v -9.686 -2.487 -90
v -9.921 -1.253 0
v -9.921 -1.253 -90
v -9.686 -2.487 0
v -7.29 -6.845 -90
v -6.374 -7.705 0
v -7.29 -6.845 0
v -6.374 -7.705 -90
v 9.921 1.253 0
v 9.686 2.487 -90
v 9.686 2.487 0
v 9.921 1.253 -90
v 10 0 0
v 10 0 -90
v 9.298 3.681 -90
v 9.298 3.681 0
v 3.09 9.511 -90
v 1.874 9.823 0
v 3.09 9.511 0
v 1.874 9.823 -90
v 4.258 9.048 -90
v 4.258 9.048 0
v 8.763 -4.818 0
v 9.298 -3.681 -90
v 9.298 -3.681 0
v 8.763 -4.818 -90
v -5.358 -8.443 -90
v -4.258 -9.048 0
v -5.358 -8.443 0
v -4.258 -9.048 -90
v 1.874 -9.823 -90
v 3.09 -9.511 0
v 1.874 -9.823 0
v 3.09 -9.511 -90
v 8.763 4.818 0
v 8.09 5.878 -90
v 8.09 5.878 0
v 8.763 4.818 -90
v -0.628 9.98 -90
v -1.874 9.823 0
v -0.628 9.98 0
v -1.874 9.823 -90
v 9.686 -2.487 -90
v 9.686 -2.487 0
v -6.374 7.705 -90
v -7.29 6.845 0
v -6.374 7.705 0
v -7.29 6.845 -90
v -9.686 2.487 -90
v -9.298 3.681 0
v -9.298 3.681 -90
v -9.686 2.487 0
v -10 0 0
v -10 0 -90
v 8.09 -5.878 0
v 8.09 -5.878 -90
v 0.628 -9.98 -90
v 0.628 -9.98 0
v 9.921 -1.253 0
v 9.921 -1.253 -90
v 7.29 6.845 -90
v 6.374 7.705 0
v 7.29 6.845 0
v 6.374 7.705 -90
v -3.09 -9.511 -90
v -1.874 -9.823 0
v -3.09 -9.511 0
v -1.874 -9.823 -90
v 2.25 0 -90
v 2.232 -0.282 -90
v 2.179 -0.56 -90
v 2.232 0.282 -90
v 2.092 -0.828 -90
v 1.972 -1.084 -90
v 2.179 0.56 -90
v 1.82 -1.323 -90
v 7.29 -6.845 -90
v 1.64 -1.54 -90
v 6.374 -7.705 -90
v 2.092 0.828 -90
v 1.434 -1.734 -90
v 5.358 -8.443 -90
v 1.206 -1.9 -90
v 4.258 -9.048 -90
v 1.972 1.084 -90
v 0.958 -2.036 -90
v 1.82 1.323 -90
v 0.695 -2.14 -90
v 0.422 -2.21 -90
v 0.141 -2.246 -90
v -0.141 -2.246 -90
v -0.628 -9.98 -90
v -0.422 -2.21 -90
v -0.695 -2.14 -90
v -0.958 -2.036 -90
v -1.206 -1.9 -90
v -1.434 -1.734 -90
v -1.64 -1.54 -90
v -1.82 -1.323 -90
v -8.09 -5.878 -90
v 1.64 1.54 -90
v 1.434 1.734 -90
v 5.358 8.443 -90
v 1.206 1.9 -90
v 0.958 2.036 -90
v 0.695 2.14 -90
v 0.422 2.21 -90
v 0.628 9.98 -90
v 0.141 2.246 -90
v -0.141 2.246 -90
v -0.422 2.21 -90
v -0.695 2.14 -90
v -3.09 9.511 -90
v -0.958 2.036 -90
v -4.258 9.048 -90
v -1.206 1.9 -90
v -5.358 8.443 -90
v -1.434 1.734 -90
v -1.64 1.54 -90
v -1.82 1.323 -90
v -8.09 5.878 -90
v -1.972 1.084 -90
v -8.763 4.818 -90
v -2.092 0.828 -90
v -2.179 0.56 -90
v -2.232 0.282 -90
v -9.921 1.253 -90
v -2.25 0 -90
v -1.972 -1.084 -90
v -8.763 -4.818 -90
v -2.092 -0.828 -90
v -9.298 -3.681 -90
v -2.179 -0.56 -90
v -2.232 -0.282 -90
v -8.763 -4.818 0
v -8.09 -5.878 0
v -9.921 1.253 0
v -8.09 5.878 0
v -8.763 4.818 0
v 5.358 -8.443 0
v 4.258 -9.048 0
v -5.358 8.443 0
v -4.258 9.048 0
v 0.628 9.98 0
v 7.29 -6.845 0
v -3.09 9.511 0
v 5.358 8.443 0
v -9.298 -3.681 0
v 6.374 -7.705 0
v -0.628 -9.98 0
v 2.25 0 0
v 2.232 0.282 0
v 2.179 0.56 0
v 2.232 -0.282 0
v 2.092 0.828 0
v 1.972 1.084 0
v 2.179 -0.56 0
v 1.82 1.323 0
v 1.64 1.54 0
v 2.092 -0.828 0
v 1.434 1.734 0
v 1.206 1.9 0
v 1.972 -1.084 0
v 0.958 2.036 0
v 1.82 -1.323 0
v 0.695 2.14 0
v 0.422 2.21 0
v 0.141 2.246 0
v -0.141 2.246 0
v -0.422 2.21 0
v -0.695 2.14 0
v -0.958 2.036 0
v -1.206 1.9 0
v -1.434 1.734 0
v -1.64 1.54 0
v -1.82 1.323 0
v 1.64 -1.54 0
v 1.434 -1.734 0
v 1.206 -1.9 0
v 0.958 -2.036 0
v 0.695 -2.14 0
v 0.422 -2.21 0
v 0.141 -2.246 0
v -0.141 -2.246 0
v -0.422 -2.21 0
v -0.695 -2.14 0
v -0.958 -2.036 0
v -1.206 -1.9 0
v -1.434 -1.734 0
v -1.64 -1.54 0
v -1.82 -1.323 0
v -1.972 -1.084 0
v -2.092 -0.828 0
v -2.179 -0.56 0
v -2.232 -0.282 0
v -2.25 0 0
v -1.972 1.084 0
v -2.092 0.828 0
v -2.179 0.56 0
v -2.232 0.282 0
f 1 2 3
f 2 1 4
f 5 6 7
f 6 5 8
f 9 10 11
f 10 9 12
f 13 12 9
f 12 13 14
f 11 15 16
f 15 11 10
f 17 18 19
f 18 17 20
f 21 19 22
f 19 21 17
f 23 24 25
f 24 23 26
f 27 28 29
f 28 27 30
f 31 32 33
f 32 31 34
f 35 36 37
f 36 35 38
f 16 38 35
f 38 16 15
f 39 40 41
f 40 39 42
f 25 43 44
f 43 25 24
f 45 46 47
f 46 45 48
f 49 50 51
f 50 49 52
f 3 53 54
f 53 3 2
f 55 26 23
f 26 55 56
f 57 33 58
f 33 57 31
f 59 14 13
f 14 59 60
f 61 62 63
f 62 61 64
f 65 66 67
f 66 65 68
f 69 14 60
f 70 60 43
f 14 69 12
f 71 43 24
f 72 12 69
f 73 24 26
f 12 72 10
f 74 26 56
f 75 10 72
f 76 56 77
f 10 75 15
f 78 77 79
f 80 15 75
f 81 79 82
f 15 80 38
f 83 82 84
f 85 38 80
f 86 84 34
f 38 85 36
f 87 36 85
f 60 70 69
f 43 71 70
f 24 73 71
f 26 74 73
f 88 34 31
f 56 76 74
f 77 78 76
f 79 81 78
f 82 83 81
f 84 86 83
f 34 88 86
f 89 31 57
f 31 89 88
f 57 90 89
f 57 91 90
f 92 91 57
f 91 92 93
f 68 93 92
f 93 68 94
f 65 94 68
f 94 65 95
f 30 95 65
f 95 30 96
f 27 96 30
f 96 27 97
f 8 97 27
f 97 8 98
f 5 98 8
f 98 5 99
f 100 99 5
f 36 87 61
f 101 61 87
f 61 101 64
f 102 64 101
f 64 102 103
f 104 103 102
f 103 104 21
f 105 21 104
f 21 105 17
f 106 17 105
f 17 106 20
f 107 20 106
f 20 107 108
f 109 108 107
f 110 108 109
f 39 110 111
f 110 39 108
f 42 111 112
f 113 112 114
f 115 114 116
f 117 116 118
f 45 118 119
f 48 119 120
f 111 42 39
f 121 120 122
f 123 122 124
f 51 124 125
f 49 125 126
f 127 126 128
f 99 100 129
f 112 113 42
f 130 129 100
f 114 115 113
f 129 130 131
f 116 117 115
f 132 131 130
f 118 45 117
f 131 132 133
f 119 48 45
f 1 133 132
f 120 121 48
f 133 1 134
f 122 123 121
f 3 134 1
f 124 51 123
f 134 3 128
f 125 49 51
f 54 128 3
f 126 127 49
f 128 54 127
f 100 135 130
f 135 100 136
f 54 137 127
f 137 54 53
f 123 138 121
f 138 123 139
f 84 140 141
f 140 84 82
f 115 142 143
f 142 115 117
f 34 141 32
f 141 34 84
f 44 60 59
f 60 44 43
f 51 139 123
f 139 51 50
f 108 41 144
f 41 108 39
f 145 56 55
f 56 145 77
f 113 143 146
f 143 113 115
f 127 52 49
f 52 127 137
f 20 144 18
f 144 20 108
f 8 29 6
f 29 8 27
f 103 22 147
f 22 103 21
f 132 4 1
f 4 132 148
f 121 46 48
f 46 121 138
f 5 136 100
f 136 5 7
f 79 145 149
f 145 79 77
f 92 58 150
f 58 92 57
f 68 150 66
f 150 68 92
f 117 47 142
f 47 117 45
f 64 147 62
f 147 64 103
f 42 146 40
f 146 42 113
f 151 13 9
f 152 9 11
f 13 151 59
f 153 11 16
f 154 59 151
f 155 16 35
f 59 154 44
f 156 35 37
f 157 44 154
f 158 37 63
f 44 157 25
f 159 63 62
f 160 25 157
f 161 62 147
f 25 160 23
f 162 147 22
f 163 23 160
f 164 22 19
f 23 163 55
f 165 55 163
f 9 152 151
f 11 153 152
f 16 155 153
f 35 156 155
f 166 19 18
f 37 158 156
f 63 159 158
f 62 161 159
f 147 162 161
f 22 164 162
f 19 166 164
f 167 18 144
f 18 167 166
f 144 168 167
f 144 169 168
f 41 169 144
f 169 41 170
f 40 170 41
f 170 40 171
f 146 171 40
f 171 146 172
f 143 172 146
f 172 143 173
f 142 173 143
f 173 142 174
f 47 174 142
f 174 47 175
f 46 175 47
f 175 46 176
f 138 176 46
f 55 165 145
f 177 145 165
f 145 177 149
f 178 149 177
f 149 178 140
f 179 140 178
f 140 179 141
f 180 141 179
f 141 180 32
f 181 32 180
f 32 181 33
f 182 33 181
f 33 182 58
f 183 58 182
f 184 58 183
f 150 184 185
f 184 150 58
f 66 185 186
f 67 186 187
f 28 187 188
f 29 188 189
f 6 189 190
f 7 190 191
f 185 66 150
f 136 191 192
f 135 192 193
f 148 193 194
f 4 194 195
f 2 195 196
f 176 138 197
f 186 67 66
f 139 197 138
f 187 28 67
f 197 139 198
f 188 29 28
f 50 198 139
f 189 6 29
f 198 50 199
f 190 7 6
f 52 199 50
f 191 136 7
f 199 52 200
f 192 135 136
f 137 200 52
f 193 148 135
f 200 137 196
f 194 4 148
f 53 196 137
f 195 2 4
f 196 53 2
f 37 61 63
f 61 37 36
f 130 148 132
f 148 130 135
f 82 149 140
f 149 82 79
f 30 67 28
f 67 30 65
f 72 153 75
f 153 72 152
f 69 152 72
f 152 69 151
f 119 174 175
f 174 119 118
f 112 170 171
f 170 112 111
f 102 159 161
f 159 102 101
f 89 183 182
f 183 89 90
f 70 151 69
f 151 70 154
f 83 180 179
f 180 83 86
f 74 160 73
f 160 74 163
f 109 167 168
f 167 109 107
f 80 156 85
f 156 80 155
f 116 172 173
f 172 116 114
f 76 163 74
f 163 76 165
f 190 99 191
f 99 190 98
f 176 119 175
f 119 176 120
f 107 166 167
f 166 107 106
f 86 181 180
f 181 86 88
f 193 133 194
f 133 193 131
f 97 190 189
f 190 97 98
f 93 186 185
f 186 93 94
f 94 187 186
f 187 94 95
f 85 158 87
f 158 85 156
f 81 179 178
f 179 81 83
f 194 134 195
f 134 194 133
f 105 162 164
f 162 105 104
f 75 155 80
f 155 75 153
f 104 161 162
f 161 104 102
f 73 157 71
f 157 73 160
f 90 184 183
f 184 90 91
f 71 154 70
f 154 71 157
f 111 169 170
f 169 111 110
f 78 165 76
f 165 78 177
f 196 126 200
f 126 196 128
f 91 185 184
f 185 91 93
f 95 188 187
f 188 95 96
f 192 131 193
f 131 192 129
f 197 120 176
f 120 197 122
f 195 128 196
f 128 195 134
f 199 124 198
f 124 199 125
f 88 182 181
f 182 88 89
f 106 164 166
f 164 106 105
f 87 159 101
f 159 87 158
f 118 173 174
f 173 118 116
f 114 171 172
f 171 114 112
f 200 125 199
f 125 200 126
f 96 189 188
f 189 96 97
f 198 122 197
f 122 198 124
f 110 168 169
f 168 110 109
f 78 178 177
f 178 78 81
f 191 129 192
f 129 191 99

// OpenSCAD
$fn = 50;


difference() {
	union() {
		translate(v = [0, 0, -90.0000000000]) {
			cylinder(h = 90, r = 10.0000000000);
		}
		cylinder(h = 0, r = 16.0000000000);
	}
	union() {
		#translate(v = [0, 0, -90]) {
			cylinder(h = 90, r = 2.2500000000);
		}
	}
}
